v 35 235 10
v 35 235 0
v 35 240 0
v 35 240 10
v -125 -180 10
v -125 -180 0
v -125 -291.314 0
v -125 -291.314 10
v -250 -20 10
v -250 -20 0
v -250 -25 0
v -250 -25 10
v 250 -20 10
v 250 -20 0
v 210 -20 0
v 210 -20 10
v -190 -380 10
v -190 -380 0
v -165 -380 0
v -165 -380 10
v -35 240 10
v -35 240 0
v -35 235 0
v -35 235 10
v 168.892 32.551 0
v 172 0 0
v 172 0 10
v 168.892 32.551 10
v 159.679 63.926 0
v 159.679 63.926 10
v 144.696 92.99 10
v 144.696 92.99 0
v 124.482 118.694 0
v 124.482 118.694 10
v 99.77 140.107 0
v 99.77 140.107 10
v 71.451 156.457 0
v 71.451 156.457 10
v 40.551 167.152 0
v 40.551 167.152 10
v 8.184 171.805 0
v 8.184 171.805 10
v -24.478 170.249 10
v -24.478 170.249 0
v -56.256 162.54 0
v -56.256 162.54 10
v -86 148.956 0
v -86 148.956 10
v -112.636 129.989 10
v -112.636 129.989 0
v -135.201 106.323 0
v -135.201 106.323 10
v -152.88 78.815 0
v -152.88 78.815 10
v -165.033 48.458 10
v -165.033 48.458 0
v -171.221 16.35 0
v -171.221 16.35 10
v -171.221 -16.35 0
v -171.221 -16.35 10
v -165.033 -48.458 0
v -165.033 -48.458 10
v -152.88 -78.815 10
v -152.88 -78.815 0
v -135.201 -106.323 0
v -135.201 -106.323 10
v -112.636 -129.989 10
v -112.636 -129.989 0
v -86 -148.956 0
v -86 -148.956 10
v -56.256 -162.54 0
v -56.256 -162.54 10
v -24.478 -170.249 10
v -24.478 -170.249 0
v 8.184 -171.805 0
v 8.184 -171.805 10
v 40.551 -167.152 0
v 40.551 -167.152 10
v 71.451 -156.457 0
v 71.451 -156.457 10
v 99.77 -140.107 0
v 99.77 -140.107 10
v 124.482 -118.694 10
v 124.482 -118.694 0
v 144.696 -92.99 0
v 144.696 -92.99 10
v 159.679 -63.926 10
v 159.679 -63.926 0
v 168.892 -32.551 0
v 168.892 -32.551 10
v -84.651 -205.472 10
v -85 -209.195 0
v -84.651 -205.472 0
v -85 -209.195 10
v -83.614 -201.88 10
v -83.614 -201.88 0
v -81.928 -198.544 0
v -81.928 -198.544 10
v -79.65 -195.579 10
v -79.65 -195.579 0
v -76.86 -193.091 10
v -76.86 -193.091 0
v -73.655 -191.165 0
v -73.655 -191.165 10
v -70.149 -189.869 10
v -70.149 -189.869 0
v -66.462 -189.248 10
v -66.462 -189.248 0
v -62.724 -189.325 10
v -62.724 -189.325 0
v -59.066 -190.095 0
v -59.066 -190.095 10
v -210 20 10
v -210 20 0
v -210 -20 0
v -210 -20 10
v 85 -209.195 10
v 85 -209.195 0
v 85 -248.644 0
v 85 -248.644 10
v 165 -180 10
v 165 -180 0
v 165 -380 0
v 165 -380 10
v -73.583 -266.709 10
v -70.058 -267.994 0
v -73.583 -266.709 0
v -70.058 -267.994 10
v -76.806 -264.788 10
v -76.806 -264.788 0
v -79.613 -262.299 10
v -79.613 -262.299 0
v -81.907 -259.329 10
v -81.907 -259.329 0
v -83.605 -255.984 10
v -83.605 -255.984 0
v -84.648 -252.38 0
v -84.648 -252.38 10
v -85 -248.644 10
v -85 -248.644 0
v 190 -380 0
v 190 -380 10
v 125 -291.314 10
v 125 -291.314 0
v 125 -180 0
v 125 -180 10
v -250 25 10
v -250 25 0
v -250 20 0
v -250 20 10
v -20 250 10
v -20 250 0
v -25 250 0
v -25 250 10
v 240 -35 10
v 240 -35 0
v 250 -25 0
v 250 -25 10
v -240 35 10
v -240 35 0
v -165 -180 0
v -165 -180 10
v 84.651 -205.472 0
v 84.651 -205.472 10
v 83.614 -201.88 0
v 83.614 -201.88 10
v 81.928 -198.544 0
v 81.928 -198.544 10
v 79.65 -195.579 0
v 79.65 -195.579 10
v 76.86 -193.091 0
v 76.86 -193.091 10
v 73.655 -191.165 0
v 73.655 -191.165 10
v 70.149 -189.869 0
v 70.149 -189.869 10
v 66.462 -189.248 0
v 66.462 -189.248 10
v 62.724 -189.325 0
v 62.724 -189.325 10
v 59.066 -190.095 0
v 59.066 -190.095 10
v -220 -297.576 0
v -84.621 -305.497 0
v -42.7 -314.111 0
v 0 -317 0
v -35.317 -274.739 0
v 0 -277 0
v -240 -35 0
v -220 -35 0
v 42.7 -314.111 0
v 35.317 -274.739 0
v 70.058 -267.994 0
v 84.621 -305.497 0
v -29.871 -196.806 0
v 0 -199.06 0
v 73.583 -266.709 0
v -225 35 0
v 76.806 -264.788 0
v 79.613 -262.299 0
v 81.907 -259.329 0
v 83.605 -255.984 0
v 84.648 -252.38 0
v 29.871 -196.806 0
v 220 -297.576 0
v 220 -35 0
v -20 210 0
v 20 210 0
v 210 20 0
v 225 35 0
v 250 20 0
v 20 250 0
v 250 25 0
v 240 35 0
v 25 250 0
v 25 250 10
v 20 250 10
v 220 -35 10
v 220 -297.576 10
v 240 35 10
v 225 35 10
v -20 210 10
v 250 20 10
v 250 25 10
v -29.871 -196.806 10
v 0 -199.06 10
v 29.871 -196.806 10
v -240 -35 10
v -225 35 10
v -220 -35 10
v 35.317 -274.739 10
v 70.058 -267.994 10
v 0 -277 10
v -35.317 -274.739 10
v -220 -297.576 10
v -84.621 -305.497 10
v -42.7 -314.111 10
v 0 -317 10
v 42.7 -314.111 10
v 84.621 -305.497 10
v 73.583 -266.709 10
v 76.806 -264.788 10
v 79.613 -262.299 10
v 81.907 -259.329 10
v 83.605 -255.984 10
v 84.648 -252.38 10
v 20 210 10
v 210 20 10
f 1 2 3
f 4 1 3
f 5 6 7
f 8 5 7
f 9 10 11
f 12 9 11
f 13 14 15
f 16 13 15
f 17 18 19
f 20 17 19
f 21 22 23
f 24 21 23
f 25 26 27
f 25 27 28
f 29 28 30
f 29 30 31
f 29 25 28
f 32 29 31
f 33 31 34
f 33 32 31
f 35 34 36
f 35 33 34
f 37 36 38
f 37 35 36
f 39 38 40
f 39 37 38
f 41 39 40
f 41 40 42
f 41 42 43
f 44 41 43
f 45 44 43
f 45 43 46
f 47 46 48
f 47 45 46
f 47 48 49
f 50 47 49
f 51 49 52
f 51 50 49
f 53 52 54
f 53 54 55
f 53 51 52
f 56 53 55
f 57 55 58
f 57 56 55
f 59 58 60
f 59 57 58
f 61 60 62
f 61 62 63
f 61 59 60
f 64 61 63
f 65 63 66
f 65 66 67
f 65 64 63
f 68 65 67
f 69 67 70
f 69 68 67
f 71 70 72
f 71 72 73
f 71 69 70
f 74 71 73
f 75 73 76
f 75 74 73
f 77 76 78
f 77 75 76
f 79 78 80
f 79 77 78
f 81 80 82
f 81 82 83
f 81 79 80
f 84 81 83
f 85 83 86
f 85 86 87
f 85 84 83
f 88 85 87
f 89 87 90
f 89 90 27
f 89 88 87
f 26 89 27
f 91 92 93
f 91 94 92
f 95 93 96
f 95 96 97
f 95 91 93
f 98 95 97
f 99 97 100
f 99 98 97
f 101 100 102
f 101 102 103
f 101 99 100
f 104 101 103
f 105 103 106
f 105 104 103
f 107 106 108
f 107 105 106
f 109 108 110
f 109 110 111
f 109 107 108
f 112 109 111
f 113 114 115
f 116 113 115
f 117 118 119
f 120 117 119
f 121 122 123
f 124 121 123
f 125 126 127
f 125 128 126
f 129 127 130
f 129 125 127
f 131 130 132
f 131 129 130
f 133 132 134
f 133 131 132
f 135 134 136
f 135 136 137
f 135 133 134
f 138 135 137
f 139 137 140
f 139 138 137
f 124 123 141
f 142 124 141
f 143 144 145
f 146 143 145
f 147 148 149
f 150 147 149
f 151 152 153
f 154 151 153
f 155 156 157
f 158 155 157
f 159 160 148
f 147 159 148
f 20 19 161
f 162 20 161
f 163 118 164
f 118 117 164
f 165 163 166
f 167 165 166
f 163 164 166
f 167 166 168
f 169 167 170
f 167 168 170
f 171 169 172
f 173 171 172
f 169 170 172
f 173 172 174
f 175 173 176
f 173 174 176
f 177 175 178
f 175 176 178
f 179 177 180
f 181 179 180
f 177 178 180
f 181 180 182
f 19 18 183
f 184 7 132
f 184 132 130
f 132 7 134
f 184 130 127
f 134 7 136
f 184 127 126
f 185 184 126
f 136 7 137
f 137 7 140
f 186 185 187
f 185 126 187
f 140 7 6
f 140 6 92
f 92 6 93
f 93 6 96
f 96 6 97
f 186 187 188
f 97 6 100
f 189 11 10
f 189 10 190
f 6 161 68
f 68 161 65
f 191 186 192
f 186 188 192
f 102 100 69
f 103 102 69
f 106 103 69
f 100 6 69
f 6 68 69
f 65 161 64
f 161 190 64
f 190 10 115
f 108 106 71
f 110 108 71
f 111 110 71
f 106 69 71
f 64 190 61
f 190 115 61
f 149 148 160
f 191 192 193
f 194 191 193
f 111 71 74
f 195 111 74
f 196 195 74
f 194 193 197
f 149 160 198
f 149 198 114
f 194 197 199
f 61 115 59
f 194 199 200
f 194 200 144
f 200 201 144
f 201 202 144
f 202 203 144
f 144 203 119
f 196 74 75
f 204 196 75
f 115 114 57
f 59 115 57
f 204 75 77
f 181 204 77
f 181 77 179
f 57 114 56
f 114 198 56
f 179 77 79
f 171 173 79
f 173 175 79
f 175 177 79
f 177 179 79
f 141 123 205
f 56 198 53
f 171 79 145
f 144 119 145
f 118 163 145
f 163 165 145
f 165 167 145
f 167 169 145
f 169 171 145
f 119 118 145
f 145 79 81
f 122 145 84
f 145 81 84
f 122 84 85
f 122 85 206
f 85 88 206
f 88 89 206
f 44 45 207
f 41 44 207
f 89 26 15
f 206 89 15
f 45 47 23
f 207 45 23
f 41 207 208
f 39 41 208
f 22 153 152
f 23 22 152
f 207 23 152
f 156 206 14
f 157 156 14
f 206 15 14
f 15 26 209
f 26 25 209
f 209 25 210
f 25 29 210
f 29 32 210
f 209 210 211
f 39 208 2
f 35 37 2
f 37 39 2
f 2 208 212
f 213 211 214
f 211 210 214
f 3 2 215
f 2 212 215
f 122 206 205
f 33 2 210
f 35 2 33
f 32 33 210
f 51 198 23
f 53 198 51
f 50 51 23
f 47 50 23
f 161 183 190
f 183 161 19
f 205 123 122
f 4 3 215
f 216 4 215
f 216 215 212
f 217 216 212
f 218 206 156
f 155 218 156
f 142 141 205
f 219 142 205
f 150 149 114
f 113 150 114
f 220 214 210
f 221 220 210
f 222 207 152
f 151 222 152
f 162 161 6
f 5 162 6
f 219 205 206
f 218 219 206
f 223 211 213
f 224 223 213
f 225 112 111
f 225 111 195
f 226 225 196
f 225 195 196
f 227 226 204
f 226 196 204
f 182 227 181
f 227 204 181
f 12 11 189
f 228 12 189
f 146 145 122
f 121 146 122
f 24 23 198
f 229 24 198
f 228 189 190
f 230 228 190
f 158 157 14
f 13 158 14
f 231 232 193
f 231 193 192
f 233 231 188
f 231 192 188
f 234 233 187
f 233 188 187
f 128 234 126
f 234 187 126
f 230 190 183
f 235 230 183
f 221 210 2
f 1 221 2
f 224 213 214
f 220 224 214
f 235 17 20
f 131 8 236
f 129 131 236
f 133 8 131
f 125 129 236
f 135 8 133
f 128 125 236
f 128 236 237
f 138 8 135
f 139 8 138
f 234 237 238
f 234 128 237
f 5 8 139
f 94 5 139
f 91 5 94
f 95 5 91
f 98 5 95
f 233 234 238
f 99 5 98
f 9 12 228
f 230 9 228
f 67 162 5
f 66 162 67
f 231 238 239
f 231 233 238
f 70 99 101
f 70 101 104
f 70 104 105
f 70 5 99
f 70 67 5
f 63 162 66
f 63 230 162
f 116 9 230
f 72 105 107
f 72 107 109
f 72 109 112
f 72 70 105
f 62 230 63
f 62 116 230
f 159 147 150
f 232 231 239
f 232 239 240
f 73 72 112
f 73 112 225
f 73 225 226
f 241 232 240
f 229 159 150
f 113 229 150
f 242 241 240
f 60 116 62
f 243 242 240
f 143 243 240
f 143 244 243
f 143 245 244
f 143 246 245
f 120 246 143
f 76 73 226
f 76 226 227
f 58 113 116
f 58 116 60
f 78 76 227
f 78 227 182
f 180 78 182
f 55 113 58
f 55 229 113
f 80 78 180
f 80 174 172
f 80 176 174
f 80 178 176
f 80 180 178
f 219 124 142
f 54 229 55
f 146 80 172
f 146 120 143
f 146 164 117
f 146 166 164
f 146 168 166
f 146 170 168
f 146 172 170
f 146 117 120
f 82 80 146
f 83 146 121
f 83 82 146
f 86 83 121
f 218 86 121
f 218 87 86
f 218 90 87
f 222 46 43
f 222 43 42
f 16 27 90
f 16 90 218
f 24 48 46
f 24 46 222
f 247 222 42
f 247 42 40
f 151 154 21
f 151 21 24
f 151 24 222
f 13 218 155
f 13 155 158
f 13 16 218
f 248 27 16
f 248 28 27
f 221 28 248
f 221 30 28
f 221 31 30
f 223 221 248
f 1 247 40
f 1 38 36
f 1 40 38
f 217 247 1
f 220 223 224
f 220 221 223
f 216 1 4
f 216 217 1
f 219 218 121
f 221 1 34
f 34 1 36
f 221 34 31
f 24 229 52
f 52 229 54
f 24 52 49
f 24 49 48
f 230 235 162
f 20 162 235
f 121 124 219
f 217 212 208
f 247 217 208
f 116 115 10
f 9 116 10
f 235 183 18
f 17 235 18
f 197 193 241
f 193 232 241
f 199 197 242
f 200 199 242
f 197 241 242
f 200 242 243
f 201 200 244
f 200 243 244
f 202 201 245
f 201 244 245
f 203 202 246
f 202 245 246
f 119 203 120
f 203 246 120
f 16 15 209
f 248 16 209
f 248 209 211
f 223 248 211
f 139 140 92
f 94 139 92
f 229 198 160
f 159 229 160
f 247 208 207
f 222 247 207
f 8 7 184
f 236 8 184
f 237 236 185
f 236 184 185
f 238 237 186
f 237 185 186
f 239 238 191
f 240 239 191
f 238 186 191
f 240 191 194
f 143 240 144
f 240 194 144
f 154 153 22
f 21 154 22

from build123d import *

# Parameters (mm, degrees)
ESQUISSE1_R        = 172
BOSS_EXTRU_1_DEPTH = 10
CONG_1_R           = 20


with BuildPart() as part:
    # Esquisse1 → Boss.-Extru.1 (new body)
    with BuildSketch(Plane.XY):
        with BuildLine():
            Line((220, -297.575677416), (220, -228.230147001))
            Line((220, -228.230147001), (220, -35))
            Line((220, -35), (240, -35))
            Line((240, -35), (250, -25))
            Line((250, -25), (250, -20))
            Line((250, -20), (210, -20))
            Line((210, -20), (210, 20))
            Line((210, 20), (250, 20))
            Line((250, 20), (250, 25))
            Line((250, 25), (240, 35))
            Line((240, 35), (225, 35))
            Line((225, 35), (35, 235))
            Line((35, 235), (35, 240))
            Line((35, 240), (25, 250))
            Line((25, 250), (20, 250))
            Line((20, 250), (20, 210))
            Line((20, 210), (-20, 210))
            Line((-20, 210), (-20, 250))
            Line((-20, 250), (-25, 250))
            Line((-25, 250), (-35, 240))
            Line((-35, 240), (-35, 235))
            Line((-35, 235), (-225, 35))
            Line((-225, 35), (-240, 35))
            Line((-240, 35), (-250, 25))
            Line((-250, 25), (-250, 20))
            Line((-250, 20), (-210, 20))
            Line((-210, 20), (-210, -20))
            Line((-210, -20), (-250, -20))
            Line((-250, -20), (-250, -25))
            Line((-250, -25), (-240, -35))
            Line((-240, -35), (-220, -35))
            Line((-220, -35), (-220, -297.575677416))
            Line((-220, -297.575677416), (-190, -380))
            Line((-190, -380), (-165, -380))
            Line((-165, -380), (-165, -180))
            Line((-165, -180), (-125, -180))
            Line((-125, -180), (-125, -291.314263297))
            ThreePointArc((-125, -291.314263297), (0, -317), (125, -291.314263297))
            Line((125, -291.314263297), (125, -180))
            Line((125, -180), (165, -180))
            Line((165, -180), (165, -380))
            Line((165, -380), (190, -380))
            Line((190, -380), (220, -297.575677416))
        make_face()
        with BuildLine():
            Line((-85, -263.636112853), (-85, -180))
            ThreePointArc((-85, -180), (0, -199.060292374), (85, -180))
            Line((85, -180), (85, -263.636112853))
            ThreePointArc((85, -263.636112853), (0, -277), (-85, -263.636112853))
        make_face(mode=Mode.SUBTRACT)
        Circle(ESQUISSE1_R, mode=Mode.SUBTRACT)
    extrude(amount=BOSS_EXTRU_1_DEPTH)

    # Congé1
    cong_1_edges = [part.edges().sort_by_distance(p)[0] for p in [
        (-85, -263.636112853, 5),
        (85, -263.636112853, 5),
        (85, -180, 5),
        (-85, -180, 5),
    ]]
    fillet(cong_1_edges, radius=CONG_1_R)


solid = part.part
